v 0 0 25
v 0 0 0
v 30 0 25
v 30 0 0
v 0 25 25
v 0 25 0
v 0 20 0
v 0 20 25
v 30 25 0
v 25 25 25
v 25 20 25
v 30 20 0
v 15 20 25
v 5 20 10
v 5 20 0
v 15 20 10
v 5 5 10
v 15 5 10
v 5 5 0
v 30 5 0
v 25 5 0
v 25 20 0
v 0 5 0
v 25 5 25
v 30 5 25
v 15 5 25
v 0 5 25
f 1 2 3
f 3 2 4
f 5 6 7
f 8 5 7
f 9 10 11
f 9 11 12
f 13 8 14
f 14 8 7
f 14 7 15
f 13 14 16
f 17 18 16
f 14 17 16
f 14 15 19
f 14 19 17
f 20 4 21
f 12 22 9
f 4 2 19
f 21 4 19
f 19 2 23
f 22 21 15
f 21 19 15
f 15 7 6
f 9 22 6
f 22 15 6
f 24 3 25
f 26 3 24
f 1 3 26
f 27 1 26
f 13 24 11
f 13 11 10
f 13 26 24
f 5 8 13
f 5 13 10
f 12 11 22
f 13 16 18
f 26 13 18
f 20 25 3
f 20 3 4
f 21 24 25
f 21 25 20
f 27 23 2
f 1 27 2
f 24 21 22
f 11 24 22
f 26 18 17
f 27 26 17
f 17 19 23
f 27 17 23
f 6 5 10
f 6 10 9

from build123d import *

# Parameters (mm, degrees)
BOSS_EXTRUDE1_DEPTH = 25
SKETCH2_W           = 10
SKETCH2_H           = 15
BOSS_EXTRUDE2_DEPTH = 10
SKETCH3_W           = 25
SKETCH3_H           = 5
BOSS_EXTRUDE3_DEPTH = 5
CUT_EXTRUDE1_DEPTH  = 5


with BuildPart() as part:
    # Sketch1 → Boss-Extrude1 (new body)
    with BuildSketch(Plane.XY):
        Polygon((0, 0), (25, 0), (25, 25), (0, 25), (0, 20), (15, 20), (15, 5), (0, 5), align=None)
    extrude(amount=BOSS_EXTRUDE1_DEPTH)

    # Sketch2 → Boss-Extrude2 (add)
    with BuildSketch(Plane.ZY.offset(-15)):
        with Locations((5, 12.5)):
            Rectangle(SKETCH2_W, SKETCH2_H)
    extrude(amount=BOSS_EXTRUDE2_DEPTH)

    # Sketch3 → Boss-Extrude3 (add)
    with BuildSketch(Plane(origin=(25, 0, 0), x_dir=(0, 0, -1), z_dir=(1, 0, 0))):
        with Locations((-12.5, 22.5)):
            Rectangle(SKETCH3_W, SKETCH3_H)
        with Locations((-12.5, 2.5)):
            Rectangle(SKETCH3_W, SKETCH3_H)
    extrude(amount=BOSS_EXTRUDE3_DEPTH)

    # Sketch4 → Cut-Extrude1 (cut)
    with BuildSketch(Plane(origin=(0, 25, 0), x_dir=(1, 0, 0), z_dir=(0, 1, 0))):
        Polygon((25, -25), (30, 0), (30, -25), align=None)
    extrude(amount=-CUT_EXTRUDE1_DEPTH, mode=Mode.SUBTRACT)


solid = part.part
